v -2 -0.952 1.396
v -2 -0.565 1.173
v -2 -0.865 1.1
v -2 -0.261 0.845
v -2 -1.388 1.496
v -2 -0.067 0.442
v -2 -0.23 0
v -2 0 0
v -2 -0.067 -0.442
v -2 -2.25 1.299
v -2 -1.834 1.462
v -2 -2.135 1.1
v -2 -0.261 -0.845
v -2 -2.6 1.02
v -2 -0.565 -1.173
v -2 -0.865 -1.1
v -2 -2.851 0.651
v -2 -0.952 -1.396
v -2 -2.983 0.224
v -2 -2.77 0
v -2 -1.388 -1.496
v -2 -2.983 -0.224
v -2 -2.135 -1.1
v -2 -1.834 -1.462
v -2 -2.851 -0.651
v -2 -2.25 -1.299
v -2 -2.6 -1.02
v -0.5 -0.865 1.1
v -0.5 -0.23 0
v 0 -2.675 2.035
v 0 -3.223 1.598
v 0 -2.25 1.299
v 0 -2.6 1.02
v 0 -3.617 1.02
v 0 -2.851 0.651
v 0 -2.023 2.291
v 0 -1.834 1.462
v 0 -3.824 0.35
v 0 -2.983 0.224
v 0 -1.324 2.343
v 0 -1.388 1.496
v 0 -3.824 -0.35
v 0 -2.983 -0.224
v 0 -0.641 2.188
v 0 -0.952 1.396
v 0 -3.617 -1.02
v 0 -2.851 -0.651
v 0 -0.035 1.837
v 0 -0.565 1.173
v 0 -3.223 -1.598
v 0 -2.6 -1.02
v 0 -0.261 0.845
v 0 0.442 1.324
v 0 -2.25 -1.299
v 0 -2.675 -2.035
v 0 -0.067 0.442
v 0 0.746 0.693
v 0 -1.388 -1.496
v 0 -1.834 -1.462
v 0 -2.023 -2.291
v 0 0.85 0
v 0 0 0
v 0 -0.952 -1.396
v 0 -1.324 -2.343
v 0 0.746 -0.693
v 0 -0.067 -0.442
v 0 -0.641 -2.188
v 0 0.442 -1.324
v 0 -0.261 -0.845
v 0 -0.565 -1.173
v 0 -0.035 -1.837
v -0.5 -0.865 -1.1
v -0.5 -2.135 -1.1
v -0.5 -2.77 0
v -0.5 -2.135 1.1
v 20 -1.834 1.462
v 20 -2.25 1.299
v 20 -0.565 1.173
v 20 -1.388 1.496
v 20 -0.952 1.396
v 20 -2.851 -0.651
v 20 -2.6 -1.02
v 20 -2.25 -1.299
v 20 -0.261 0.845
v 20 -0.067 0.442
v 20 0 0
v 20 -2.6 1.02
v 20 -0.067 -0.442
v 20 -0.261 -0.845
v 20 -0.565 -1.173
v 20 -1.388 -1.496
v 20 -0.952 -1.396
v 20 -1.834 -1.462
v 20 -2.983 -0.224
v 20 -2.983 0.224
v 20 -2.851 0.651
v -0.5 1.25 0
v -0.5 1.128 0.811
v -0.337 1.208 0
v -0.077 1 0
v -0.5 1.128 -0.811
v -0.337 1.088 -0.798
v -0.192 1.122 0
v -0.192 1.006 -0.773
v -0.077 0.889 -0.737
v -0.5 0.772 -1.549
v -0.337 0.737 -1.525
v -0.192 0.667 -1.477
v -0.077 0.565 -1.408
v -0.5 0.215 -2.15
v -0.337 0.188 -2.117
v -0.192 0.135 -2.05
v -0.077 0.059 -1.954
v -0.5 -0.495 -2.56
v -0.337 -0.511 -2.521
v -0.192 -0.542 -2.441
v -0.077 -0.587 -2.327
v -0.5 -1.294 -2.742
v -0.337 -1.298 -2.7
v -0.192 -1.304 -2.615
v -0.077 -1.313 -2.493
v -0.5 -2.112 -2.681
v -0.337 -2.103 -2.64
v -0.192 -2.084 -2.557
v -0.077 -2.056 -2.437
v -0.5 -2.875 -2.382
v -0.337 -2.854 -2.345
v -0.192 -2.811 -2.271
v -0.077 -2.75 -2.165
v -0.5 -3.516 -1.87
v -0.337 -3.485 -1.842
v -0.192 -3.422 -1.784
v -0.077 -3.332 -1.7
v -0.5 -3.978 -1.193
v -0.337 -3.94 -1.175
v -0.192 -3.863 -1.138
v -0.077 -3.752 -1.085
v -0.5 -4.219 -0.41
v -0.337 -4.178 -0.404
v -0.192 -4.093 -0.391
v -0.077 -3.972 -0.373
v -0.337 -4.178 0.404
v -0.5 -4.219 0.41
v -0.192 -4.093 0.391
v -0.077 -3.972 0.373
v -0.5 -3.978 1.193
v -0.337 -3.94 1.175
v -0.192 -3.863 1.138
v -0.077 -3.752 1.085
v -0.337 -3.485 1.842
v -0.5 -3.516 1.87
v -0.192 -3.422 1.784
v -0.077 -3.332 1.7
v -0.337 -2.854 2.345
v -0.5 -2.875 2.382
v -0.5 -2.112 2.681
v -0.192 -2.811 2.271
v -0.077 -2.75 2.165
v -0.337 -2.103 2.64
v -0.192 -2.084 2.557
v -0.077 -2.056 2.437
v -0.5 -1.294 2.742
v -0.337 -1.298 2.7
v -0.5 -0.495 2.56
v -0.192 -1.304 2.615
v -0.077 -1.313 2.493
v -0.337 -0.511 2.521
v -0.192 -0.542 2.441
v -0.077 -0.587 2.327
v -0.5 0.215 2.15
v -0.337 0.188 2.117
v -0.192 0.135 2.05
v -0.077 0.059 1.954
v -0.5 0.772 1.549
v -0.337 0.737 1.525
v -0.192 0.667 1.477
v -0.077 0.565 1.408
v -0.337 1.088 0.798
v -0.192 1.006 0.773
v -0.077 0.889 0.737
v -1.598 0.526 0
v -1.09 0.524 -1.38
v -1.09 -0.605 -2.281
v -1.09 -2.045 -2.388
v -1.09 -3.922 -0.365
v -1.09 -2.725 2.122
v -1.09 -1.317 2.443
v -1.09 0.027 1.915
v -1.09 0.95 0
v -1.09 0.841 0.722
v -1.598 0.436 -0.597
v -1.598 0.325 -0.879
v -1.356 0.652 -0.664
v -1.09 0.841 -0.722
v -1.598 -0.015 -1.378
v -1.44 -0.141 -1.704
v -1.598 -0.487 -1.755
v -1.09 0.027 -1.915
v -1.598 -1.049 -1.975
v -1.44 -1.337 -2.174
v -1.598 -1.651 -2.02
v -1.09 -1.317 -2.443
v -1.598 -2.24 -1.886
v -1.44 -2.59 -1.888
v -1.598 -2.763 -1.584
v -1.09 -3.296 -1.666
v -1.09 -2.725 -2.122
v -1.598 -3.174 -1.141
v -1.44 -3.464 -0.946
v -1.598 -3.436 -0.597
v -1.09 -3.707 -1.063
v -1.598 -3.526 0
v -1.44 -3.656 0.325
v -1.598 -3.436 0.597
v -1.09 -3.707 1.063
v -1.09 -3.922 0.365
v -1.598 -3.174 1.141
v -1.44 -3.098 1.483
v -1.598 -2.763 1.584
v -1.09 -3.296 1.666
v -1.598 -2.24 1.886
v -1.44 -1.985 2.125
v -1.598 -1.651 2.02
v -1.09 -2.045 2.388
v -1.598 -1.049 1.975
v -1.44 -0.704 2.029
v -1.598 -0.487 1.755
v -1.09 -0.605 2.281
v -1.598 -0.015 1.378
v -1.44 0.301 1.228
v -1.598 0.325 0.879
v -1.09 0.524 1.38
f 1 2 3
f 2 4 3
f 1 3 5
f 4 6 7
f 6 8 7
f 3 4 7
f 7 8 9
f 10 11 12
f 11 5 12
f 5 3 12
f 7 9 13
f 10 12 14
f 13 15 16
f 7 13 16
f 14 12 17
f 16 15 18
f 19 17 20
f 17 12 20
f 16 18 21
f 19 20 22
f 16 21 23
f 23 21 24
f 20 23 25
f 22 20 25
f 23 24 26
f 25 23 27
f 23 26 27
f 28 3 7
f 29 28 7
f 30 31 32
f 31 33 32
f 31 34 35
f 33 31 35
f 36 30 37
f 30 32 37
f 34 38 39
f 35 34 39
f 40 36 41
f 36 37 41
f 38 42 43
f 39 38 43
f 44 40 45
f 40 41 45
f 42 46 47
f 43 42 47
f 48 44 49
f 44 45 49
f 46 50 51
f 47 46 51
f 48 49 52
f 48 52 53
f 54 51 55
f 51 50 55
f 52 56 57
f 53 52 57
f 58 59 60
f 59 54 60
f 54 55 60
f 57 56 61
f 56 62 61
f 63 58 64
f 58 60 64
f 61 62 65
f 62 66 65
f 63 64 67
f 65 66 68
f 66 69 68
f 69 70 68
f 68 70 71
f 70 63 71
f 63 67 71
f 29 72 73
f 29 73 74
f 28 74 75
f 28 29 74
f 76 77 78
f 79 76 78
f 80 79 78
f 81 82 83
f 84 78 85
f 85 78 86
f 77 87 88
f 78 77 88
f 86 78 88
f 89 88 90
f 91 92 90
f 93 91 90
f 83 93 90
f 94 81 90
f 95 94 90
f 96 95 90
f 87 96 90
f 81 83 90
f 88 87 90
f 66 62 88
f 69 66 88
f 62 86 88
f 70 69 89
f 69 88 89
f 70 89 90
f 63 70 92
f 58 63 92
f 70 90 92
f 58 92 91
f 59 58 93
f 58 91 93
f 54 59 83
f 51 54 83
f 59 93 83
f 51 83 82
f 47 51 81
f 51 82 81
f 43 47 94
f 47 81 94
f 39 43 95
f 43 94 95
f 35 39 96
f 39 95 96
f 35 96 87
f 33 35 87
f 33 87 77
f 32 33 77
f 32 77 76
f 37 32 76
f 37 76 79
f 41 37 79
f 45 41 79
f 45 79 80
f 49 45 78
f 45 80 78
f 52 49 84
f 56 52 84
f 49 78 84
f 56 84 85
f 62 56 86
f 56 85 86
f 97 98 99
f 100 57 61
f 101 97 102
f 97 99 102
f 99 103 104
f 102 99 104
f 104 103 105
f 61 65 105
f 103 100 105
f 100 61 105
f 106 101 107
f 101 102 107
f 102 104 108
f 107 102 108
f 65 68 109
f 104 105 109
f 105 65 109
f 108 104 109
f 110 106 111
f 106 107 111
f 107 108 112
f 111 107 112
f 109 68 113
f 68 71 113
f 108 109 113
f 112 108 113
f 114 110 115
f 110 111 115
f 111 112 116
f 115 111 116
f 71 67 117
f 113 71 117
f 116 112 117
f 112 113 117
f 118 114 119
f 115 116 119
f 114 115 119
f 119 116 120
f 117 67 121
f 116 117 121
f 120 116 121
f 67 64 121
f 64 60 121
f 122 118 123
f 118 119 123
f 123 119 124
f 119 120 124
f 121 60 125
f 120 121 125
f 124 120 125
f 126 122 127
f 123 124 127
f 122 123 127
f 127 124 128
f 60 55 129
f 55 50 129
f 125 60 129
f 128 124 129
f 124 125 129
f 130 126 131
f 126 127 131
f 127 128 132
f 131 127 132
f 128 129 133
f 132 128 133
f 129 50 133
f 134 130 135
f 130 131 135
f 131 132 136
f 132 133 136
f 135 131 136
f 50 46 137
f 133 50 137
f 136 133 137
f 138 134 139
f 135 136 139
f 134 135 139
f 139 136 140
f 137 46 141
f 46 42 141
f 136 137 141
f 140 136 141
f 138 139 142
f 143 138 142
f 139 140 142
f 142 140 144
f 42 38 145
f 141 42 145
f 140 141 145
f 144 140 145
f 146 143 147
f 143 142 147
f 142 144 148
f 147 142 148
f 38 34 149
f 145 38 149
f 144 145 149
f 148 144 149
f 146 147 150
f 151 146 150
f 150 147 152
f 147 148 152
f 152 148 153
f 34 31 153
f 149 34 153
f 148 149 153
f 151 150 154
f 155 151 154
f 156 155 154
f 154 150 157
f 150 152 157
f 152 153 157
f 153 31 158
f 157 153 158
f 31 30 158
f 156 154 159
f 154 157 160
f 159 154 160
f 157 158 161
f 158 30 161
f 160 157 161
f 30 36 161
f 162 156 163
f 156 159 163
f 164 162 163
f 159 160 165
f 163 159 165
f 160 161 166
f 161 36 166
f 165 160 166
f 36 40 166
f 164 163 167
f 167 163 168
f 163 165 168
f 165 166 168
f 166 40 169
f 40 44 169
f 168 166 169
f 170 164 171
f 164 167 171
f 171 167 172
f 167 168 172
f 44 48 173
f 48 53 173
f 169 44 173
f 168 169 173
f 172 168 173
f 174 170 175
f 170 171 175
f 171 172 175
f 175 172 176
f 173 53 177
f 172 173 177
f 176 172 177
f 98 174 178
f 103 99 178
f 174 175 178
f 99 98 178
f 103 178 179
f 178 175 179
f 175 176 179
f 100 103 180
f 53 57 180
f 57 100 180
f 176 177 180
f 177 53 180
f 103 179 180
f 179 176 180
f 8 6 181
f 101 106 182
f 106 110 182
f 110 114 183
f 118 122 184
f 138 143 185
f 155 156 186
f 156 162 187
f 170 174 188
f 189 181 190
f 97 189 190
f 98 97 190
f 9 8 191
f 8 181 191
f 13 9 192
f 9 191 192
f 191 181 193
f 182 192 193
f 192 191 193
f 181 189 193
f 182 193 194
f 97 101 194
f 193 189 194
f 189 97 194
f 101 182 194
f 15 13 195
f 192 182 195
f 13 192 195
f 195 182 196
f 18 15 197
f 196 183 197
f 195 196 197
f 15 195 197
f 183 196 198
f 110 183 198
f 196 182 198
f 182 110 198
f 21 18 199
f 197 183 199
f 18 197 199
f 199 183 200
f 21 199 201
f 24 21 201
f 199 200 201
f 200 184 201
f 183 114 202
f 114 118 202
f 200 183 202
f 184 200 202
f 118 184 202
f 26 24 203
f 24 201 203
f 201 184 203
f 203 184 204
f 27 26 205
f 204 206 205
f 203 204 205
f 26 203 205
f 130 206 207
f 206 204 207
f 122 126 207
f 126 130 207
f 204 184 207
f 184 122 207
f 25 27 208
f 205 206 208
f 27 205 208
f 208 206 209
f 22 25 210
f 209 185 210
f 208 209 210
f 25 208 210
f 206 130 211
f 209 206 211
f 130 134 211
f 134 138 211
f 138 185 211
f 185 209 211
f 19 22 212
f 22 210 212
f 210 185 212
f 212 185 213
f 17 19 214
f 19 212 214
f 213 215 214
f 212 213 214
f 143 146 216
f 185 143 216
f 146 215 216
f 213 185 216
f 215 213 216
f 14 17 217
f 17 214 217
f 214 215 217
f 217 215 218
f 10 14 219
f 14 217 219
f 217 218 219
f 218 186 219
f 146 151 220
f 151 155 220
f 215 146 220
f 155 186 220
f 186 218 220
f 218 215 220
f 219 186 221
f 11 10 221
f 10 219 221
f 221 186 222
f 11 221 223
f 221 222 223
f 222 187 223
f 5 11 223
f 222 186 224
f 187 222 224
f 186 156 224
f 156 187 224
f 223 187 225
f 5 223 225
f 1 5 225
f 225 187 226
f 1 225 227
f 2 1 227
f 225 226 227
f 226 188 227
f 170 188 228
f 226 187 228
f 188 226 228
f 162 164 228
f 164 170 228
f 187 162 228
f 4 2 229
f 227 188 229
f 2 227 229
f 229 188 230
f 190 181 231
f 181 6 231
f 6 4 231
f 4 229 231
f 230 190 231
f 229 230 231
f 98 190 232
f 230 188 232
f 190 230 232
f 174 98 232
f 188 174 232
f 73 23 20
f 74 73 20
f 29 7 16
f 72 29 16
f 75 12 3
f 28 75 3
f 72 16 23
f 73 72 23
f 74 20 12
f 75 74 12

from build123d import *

# Parameters (mm, degrees)
CUT_EXTRUDE1_DEPTH = 1.5


with BuildPart() as part:
    # Sketch1 → Revolve1 (revolve)
    with BuildSketch(Plane.XY):
        with BuildLine():
            Line((0, 0), (20, 0))
            Line((20, 0), (20, -1.5))
            Line((20, -1.5), (-2, -1.5))
            Line((-2, -1.5), (-2, 0))
            ThreePointArc((-2, 0), (-1.356037029, 0.752244435), (-0.5, 1.25))
            ThreePointArc((-0.5, 1.25), (-0.192181086, 1.122273642), (0, 0.85))
            Line((0, 0.85), (0, 0))
        make_face()
    revolve(axis=Axis((20, -1.5, 0), (-1, 0, 0)))

    # Sketch2 → Cut-Extrude1 (cut)
    with BuildSketch(Plane.ZY.offset(2)):
        Polygon((0, -0.229829408), (-1.1, -0.864914704), (-1.1, -2.135085296), (0, -2.770170592), (1.1, -2.135085296), (1.1, -0.864914704), align=None)
    extrude(amount=-CUT_EXTRUDE1_DEPTH, mode=Mode.SUBTRACT)


solid = part.part
